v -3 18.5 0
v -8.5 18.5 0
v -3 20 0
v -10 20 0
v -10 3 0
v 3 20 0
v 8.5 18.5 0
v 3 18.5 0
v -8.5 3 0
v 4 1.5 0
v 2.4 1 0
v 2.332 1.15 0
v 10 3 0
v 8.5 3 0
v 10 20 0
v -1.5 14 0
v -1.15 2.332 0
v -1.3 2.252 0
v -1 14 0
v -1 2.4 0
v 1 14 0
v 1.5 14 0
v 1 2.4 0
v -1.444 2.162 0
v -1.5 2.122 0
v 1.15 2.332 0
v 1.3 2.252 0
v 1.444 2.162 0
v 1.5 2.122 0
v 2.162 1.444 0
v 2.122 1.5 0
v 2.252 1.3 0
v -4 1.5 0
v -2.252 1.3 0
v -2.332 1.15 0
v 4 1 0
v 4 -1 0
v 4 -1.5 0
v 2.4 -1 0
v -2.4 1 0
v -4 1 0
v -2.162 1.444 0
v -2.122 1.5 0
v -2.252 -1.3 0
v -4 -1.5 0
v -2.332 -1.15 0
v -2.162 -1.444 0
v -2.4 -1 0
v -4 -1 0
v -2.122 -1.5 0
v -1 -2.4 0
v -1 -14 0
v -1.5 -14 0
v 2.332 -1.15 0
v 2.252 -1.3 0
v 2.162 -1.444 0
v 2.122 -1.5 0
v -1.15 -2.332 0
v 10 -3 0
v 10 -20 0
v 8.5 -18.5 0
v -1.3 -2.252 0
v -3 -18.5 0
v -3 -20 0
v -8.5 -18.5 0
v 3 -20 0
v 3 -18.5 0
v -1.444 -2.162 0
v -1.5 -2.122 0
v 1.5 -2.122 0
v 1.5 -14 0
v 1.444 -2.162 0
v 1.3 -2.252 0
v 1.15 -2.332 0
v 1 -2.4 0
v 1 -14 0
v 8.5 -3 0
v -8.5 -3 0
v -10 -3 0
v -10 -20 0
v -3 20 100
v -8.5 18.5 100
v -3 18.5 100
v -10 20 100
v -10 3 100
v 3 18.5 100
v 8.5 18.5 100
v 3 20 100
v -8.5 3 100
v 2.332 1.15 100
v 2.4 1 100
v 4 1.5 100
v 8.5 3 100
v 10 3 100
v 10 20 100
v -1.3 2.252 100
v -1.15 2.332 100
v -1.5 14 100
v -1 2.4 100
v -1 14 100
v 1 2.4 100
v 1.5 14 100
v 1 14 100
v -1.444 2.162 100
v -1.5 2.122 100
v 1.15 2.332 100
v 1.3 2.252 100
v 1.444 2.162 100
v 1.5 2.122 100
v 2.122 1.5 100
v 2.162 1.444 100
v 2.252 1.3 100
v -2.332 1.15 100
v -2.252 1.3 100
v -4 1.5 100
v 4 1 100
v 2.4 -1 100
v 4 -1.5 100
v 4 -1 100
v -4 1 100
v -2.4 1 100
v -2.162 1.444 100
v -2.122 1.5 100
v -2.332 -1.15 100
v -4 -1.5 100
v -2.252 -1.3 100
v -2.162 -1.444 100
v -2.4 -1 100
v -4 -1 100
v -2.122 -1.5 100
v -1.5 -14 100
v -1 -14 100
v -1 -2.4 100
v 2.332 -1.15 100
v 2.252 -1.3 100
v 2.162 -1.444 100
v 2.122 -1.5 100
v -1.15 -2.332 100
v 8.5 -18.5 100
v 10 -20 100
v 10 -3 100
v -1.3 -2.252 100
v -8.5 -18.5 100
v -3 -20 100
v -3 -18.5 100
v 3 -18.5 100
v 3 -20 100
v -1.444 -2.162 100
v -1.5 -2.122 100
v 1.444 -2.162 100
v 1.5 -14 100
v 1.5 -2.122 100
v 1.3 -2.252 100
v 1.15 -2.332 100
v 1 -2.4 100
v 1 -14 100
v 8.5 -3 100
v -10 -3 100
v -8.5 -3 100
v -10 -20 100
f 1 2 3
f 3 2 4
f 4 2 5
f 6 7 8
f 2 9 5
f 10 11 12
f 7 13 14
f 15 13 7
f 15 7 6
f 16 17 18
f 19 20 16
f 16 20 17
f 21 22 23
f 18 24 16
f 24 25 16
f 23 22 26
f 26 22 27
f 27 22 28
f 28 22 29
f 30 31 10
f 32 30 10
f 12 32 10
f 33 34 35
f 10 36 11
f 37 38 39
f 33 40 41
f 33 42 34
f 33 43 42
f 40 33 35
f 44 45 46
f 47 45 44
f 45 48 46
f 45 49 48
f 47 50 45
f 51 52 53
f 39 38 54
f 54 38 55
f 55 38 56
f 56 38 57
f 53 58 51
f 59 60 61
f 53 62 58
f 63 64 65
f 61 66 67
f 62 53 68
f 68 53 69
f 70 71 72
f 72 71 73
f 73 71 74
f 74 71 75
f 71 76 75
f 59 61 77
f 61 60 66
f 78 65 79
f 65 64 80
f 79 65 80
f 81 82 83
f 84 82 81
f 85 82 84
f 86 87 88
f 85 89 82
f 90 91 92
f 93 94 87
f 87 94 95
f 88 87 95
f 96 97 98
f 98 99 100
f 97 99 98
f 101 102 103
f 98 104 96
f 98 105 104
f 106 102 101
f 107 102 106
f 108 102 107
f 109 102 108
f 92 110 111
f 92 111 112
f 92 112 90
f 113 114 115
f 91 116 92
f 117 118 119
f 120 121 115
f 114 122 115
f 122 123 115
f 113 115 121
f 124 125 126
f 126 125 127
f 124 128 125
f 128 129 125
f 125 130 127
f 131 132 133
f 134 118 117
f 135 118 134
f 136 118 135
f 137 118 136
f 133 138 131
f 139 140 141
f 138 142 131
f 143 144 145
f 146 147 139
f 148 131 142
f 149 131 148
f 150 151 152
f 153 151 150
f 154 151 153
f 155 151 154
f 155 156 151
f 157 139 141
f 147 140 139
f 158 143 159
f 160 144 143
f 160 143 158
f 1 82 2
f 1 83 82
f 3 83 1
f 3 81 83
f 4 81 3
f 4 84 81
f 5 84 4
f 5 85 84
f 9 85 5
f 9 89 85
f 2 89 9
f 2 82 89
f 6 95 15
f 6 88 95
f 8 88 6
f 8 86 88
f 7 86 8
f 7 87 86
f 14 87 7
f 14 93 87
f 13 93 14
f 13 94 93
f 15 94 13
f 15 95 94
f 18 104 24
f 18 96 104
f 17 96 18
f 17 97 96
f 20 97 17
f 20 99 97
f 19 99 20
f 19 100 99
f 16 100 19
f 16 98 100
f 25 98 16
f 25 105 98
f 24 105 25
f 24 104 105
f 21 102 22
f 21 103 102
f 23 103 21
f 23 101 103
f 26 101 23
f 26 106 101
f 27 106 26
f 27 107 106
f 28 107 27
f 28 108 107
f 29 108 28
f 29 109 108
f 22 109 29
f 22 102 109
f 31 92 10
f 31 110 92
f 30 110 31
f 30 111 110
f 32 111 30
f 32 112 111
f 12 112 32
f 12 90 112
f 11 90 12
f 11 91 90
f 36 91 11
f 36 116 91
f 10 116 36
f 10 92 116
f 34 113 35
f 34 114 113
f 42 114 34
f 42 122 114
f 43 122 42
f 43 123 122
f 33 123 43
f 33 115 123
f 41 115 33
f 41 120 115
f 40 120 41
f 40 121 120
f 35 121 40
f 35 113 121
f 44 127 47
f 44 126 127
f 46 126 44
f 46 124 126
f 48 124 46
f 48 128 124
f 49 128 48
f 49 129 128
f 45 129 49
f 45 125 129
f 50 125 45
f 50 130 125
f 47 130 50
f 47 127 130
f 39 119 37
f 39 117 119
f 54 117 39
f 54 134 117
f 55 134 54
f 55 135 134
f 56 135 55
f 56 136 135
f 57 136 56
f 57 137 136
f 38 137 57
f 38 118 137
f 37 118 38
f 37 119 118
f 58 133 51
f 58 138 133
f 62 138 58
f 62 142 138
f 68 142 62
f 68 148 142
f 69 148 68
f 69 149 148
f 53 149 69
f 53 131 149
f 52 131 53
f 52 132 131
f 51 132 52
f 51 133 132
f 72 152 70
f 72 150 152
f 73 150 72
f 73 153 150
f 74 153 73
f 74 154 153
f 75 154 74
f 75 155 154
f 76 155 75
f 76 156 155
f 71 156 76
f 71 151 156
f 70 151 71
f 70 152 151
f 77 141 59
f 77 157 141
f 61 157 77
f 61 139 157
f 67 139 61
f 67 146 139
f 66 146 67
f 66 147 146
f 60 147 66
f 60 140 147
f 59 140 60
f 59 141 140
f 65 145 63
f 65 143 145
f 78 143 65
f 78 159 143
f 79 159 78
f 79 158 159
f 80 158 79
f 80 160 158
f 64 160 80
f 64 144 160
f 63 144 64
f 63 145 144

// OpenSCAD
$fn = 96;

// 20x40 aluminium extrusion profile (approximate), 100mm long
// Cross-section: 20mm (X) x 40mm (Y), extruded along Z

length = 100;
w = 20;
h = 40;

// Profile parameters (typical-ish for 2040)
wall = 2.0;          // outer wall thickness
slot_open = 6.0;     // slot mouth opening
slot_depth = 6.0;    // how far slot cuts in from outer face
center_hole_d = 5.2; // center bore
web = 2.0;           // internal web thickness
eps = 0.05;          // tiny overlap to avoid coincident faces

module profile_2040_2d() {
    difference() {
        // ONE connected outer body
        square([w, h], center=true);

        // Center bore
        circle(d=center_hole_d);

        // Internal lightening pockets (kept inside walls/webs)
        // Four corner pockets
        pocket_w = w/2 - wall - web/2;
        pocket_h = h/2 - wall - web/2;

        for (sx = [-1, 1], sy = [-1, 1]) {
            translate([sx*(w/4), sy*(h/4)])
                square([pocket_w, pocket_h], center=true);
        }

        // Central cross pocket to reduce mass but keep a connected "plus" web
        // (does not reach outer walls)
        square([w - 2*(wall + web), web], center=true);
        square([web, h - 2*(wall + web)], center=true);

        // T-slot cuts on all four sides (rectangular approximation)
        // +Y / -Y
        for (sy = [-1, 1]) {
            translate([0, sy*(h/2 - slot_depth/2 + eps)])
                square([slot_open, slot_depth + 2*eps], center=true);
        }
        // +X / -X
        for (sx = [-1, 1]) {
            translate([sx*(w/2 - slot_depth/2 + eps), 0])
                square([slot_depth + 2*eps, slot_open], center=true);
        }
    }
}

linear_extrude(height=length, center=false, convexity=10)
    profile_2040_2d();
